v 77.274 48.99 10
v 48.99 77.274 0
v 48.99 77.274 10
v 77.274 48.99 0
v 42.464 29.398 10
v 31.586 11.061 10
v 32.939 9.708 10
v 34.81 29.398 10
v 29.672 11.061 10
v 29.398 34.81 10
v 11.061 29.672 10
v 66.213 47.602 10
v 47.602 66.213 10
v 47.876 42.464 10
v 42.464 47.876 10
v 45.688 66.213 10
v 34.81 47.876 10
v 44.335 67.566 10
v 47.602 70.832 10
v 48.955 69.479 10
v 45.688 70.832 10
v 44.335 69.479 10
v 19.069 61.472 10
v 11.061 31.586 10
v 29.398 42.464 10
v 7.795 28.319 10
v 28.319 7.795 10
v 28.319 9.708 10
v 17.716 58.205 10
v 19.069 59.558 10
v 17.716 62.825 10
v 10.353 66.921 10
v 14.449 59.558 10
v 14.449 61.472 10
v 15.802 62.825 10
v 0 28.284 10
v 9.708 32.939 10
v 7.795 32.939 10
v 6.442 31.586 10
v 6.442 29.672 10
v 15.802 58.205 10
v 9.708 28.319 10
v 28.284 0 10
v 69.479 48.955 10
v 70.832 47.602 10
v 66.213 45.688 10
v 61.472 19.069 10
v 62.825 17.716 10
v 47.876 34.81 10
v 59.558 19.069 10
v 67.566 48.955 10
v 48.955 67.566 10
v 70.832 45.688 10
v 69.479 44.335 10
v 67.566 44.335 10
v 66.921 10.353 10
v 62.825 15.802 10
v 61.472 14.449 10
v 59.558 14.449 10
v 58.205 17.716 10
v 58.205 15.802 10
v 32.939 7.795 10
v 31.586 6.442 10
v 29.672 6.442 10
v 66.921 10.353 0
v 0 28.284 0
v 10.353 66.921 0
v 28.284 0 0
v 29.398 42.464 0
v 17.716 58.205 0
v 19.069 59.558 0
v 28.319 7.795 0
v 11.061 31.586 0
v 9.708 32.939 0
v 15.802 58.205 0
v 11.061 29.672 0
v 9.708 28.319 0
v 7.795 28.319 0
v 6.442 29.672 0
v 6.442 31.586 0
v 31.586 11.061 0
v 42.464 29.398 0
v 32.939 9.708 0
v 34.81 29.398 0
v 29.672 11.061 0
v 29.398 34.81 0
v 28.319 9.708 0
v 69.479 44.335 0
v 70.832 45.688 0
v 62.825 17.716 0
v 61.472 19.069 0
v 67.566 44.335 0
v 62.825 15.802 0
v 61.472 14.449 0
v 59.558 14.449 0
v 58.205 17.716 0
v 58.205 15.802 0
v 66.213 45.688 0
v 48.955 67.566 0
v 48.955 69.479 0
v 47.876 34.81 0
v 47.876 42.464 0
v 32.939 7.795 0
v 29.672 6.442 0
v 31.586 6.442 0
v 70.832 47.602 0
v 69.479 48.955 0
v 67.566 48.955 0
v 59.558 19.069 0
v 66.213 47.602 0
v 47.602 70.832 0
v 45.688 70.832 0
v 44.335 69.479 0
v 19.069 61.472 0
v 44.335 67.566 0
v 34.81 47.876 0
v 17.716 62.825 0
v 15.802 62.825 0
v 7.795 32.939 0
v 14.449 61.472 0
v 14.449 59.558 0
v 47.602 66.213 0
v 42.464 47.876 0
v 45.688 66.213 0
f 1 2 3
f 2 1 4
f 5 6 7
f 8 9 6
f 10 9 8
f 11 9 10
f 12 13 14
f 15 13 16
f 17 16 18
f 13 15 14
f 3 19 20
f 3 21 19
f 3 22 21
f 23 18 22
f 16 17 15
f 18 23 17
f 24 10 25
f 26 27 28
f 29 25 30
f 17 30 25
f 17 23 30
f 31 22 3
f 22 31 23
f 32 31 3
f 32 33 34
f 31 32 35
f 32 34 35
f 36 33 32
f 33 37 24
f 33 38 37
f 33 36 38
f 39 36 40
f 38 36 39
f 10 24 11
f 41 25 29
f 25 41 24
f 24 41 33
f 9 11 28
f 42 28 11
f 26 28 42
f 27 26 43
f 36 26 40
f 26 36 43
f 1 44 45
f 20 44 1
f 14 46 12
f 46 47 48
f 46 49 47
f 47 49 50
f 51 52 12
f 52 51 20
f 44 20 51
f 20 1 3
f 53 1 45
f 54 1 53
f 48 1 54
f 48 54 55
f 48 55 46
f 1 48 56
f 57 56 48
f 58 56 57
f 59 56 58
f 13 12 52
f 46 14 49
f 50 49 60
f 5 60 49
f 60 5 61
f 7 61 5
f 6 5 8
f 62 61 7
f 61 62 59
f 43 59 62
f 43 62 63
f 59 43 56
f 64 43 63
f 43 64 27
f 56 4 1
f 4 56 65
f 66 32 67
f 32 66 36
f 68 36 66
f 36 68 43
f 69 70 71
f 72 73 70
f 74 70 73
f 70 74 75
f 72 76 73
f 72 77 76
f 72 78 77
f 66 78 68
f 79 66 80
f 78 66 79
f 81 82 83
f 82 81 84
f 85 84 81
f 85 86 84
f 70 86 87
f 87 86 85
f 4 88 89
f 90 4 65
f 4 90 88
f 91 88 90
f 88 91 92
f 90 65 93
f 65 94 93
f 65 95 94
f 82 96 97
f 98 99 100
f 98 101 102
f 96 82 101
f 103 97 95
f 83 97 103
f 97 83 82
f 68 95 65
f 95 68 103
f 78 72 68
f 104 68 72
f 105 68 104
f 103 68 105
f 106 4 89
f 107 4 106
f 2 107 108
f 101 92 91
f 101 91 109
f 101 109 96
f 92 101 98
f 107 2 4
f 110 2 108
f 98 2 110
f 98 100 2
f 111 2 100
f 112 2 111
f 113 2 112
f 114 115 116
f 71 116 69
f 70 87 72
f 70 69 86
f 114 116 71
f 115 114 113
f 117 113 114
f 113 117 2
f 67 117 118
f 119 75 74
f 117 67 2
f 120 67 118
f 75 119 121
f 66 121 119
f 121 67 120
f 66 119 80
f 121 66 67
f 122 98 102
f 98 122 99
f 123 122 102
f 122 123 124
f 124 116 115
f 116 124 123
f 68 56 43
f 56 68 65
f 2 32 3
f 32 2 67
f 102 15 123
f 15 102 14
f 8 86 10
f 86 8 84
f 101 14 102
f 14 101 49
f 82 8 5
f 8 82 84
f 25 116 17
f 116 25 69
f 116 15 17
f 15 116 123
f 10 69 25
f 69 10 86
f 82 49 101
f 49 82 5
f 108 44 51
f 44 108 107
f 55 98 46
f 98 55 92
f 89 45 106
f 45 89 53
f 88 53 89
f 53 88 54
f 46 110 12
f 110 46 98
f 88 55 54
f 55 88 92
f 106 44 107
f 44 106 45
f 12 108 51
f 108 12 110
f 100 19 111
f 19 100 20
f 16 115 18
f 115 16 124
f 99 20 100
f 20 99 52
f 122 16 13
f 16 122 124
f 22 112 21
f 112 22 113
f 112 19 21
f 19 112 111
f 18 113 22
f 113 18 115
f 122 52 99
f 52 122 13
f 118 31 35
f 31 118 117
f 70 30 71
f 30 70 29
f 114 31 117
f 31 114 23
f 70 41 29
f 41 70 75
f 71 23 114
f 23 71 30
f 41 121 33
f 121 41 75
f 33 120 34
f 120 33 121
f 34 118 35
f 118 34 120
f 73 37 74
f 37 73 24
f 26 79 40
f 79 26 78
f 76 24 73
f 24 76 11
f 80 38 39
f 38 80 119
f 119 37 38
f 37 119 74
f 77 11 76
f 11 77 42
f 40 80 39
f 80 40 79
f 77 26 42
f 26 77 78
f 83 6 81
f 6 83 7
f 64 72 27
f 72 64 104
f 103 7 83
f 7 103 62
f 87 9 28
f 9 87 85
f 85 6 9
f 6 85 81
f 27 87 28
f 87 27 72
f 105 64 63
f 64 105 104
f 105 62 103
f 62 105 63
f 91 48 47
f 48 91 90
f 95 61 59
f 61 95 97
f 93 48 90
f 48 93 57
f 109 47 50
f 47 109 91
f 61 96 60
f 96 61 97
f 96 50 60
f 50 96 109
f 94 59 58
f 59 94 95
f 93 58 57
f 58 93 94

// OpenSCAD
$fn = 32;

// ----------------------------------------------------------------------
// Polygon plate: 6-gon R40, 6 bolt windows
// ----------------------------------------------------------------------

// --- parameters (mm) ---
sides = 6;                // number of polygon sides
plate_r = 40;             // circumscribed radius of the polygon
bore_r = 10;              // centre bore radius
bolts = 6;                // number of bolt windows
ring_r = 30.94;           // bolt-circle radius
bolt_r = 2.5;             // bolt window radius
plate_t = 10;             // plate thickness, Z (extrusion height)

plate_d = 2 * plate_r;  // circumscribed diameter
bore_d = 2 * bore_r;  // centre bore diameter
bolt_d = 2 * bolt_r;  // bolt window diameter
ring_d = 2 * ring_r;  // bolt-circle diameter

profile = [[77.274, 48.99], [48.99, 77.274], [10.353, 66.921], [0, 28.284], [28.284, 0], [66.921, 10.353]];  // primary outline, 6 points, counter clockwise
void_1 = [[47.876, 42.464], [42.464, 47.876], [34.81, 47.876], [29.398, 42.464], [29.398, 34.81], [34.81, 29.398], [42.464, 29.398], [47.876, 34.81]];  // centre bore, 8 points
void_2 = [[70.832, 47.602], [69.479, 48.955], [67.566, 48.955], [66.213, 47.602], [66.213, 45.688], [67.566, 44.335], [69.479, 44.335], [70.832, 45.688]];  // bolt window 1, 8 points
void_3 = [[48.955, 69.479], [47.602, 70.832], [45.688, 70.832], [44.335, 69.479], [44.335, 67.566], [45.688, 66.213], [47.602, 66.213], [48.955, 67.566]];  // bolt window 2, 8 points
void_4 = [[19.069, 61.472], [17.716, 62.825], [15.802, 62.825], [14.449, 61.472], [14.449, 59.558], [15.802, 58.205], [17.716, 58.205], [19.069, 59.558]];  // bolt window 3, 8 points
void_5 = [[11.061, 31.586], [9.708, 32.939], [7.795, 32.939], [6.442, 31.586], [6.442, 29.672], [7.795, 28.319], [9.708, 28.319], [11.061, 29.672]];  // bolt window 4, 8 points
void_6 = [[32.939, 9.708], [31.586, 11.061], [29.672, 11.061], [28.319, 9.708], [28.319, 7.795], [29.672, 6.442], [31.586, 6.442], [32.939, 7.795]];  // bolt window 5, 8 points
void_7 = [[62.825, 17.716], [61.472, 19.069], [59.558, 19.069], [58.205, 17.716], [58.205, 15.802], [59.558, 14.449], [61.472, 14.449], [62.825, 15.802]];  // bolt window 6, 8 points

// --- the one profile operation ---
difference() {
  linear_extrude(height = plate_t) polygon(points = profile);
  translate([0, 0, -1])
    linear_extrude(height = plate_t + 2) polygon(points = void_1);
  translate([0, 0, -1])
    linear_extrude(height = plate_t + 2) polygon(points = void_2);
  translate([0, 0, -1])
    linear_extrude(height = plate_t + 2) polygon(points = void_3);
  translate([0, 0, -1])
    linear_extrude(height = plate_t + 2) polygon(points = void_4);
  translate([0, 0, -1])
    linear_extrude(height = plate_t + 2) polygon(points = void_5);
  translate([0, 0, -1])
    linear_extrude(height = plate_t + 2) polygon(points = void_6);
  translate([0, 0, -1])
    linear_extrude(height = plate_t + 2) polygon(points = void_7);
}
